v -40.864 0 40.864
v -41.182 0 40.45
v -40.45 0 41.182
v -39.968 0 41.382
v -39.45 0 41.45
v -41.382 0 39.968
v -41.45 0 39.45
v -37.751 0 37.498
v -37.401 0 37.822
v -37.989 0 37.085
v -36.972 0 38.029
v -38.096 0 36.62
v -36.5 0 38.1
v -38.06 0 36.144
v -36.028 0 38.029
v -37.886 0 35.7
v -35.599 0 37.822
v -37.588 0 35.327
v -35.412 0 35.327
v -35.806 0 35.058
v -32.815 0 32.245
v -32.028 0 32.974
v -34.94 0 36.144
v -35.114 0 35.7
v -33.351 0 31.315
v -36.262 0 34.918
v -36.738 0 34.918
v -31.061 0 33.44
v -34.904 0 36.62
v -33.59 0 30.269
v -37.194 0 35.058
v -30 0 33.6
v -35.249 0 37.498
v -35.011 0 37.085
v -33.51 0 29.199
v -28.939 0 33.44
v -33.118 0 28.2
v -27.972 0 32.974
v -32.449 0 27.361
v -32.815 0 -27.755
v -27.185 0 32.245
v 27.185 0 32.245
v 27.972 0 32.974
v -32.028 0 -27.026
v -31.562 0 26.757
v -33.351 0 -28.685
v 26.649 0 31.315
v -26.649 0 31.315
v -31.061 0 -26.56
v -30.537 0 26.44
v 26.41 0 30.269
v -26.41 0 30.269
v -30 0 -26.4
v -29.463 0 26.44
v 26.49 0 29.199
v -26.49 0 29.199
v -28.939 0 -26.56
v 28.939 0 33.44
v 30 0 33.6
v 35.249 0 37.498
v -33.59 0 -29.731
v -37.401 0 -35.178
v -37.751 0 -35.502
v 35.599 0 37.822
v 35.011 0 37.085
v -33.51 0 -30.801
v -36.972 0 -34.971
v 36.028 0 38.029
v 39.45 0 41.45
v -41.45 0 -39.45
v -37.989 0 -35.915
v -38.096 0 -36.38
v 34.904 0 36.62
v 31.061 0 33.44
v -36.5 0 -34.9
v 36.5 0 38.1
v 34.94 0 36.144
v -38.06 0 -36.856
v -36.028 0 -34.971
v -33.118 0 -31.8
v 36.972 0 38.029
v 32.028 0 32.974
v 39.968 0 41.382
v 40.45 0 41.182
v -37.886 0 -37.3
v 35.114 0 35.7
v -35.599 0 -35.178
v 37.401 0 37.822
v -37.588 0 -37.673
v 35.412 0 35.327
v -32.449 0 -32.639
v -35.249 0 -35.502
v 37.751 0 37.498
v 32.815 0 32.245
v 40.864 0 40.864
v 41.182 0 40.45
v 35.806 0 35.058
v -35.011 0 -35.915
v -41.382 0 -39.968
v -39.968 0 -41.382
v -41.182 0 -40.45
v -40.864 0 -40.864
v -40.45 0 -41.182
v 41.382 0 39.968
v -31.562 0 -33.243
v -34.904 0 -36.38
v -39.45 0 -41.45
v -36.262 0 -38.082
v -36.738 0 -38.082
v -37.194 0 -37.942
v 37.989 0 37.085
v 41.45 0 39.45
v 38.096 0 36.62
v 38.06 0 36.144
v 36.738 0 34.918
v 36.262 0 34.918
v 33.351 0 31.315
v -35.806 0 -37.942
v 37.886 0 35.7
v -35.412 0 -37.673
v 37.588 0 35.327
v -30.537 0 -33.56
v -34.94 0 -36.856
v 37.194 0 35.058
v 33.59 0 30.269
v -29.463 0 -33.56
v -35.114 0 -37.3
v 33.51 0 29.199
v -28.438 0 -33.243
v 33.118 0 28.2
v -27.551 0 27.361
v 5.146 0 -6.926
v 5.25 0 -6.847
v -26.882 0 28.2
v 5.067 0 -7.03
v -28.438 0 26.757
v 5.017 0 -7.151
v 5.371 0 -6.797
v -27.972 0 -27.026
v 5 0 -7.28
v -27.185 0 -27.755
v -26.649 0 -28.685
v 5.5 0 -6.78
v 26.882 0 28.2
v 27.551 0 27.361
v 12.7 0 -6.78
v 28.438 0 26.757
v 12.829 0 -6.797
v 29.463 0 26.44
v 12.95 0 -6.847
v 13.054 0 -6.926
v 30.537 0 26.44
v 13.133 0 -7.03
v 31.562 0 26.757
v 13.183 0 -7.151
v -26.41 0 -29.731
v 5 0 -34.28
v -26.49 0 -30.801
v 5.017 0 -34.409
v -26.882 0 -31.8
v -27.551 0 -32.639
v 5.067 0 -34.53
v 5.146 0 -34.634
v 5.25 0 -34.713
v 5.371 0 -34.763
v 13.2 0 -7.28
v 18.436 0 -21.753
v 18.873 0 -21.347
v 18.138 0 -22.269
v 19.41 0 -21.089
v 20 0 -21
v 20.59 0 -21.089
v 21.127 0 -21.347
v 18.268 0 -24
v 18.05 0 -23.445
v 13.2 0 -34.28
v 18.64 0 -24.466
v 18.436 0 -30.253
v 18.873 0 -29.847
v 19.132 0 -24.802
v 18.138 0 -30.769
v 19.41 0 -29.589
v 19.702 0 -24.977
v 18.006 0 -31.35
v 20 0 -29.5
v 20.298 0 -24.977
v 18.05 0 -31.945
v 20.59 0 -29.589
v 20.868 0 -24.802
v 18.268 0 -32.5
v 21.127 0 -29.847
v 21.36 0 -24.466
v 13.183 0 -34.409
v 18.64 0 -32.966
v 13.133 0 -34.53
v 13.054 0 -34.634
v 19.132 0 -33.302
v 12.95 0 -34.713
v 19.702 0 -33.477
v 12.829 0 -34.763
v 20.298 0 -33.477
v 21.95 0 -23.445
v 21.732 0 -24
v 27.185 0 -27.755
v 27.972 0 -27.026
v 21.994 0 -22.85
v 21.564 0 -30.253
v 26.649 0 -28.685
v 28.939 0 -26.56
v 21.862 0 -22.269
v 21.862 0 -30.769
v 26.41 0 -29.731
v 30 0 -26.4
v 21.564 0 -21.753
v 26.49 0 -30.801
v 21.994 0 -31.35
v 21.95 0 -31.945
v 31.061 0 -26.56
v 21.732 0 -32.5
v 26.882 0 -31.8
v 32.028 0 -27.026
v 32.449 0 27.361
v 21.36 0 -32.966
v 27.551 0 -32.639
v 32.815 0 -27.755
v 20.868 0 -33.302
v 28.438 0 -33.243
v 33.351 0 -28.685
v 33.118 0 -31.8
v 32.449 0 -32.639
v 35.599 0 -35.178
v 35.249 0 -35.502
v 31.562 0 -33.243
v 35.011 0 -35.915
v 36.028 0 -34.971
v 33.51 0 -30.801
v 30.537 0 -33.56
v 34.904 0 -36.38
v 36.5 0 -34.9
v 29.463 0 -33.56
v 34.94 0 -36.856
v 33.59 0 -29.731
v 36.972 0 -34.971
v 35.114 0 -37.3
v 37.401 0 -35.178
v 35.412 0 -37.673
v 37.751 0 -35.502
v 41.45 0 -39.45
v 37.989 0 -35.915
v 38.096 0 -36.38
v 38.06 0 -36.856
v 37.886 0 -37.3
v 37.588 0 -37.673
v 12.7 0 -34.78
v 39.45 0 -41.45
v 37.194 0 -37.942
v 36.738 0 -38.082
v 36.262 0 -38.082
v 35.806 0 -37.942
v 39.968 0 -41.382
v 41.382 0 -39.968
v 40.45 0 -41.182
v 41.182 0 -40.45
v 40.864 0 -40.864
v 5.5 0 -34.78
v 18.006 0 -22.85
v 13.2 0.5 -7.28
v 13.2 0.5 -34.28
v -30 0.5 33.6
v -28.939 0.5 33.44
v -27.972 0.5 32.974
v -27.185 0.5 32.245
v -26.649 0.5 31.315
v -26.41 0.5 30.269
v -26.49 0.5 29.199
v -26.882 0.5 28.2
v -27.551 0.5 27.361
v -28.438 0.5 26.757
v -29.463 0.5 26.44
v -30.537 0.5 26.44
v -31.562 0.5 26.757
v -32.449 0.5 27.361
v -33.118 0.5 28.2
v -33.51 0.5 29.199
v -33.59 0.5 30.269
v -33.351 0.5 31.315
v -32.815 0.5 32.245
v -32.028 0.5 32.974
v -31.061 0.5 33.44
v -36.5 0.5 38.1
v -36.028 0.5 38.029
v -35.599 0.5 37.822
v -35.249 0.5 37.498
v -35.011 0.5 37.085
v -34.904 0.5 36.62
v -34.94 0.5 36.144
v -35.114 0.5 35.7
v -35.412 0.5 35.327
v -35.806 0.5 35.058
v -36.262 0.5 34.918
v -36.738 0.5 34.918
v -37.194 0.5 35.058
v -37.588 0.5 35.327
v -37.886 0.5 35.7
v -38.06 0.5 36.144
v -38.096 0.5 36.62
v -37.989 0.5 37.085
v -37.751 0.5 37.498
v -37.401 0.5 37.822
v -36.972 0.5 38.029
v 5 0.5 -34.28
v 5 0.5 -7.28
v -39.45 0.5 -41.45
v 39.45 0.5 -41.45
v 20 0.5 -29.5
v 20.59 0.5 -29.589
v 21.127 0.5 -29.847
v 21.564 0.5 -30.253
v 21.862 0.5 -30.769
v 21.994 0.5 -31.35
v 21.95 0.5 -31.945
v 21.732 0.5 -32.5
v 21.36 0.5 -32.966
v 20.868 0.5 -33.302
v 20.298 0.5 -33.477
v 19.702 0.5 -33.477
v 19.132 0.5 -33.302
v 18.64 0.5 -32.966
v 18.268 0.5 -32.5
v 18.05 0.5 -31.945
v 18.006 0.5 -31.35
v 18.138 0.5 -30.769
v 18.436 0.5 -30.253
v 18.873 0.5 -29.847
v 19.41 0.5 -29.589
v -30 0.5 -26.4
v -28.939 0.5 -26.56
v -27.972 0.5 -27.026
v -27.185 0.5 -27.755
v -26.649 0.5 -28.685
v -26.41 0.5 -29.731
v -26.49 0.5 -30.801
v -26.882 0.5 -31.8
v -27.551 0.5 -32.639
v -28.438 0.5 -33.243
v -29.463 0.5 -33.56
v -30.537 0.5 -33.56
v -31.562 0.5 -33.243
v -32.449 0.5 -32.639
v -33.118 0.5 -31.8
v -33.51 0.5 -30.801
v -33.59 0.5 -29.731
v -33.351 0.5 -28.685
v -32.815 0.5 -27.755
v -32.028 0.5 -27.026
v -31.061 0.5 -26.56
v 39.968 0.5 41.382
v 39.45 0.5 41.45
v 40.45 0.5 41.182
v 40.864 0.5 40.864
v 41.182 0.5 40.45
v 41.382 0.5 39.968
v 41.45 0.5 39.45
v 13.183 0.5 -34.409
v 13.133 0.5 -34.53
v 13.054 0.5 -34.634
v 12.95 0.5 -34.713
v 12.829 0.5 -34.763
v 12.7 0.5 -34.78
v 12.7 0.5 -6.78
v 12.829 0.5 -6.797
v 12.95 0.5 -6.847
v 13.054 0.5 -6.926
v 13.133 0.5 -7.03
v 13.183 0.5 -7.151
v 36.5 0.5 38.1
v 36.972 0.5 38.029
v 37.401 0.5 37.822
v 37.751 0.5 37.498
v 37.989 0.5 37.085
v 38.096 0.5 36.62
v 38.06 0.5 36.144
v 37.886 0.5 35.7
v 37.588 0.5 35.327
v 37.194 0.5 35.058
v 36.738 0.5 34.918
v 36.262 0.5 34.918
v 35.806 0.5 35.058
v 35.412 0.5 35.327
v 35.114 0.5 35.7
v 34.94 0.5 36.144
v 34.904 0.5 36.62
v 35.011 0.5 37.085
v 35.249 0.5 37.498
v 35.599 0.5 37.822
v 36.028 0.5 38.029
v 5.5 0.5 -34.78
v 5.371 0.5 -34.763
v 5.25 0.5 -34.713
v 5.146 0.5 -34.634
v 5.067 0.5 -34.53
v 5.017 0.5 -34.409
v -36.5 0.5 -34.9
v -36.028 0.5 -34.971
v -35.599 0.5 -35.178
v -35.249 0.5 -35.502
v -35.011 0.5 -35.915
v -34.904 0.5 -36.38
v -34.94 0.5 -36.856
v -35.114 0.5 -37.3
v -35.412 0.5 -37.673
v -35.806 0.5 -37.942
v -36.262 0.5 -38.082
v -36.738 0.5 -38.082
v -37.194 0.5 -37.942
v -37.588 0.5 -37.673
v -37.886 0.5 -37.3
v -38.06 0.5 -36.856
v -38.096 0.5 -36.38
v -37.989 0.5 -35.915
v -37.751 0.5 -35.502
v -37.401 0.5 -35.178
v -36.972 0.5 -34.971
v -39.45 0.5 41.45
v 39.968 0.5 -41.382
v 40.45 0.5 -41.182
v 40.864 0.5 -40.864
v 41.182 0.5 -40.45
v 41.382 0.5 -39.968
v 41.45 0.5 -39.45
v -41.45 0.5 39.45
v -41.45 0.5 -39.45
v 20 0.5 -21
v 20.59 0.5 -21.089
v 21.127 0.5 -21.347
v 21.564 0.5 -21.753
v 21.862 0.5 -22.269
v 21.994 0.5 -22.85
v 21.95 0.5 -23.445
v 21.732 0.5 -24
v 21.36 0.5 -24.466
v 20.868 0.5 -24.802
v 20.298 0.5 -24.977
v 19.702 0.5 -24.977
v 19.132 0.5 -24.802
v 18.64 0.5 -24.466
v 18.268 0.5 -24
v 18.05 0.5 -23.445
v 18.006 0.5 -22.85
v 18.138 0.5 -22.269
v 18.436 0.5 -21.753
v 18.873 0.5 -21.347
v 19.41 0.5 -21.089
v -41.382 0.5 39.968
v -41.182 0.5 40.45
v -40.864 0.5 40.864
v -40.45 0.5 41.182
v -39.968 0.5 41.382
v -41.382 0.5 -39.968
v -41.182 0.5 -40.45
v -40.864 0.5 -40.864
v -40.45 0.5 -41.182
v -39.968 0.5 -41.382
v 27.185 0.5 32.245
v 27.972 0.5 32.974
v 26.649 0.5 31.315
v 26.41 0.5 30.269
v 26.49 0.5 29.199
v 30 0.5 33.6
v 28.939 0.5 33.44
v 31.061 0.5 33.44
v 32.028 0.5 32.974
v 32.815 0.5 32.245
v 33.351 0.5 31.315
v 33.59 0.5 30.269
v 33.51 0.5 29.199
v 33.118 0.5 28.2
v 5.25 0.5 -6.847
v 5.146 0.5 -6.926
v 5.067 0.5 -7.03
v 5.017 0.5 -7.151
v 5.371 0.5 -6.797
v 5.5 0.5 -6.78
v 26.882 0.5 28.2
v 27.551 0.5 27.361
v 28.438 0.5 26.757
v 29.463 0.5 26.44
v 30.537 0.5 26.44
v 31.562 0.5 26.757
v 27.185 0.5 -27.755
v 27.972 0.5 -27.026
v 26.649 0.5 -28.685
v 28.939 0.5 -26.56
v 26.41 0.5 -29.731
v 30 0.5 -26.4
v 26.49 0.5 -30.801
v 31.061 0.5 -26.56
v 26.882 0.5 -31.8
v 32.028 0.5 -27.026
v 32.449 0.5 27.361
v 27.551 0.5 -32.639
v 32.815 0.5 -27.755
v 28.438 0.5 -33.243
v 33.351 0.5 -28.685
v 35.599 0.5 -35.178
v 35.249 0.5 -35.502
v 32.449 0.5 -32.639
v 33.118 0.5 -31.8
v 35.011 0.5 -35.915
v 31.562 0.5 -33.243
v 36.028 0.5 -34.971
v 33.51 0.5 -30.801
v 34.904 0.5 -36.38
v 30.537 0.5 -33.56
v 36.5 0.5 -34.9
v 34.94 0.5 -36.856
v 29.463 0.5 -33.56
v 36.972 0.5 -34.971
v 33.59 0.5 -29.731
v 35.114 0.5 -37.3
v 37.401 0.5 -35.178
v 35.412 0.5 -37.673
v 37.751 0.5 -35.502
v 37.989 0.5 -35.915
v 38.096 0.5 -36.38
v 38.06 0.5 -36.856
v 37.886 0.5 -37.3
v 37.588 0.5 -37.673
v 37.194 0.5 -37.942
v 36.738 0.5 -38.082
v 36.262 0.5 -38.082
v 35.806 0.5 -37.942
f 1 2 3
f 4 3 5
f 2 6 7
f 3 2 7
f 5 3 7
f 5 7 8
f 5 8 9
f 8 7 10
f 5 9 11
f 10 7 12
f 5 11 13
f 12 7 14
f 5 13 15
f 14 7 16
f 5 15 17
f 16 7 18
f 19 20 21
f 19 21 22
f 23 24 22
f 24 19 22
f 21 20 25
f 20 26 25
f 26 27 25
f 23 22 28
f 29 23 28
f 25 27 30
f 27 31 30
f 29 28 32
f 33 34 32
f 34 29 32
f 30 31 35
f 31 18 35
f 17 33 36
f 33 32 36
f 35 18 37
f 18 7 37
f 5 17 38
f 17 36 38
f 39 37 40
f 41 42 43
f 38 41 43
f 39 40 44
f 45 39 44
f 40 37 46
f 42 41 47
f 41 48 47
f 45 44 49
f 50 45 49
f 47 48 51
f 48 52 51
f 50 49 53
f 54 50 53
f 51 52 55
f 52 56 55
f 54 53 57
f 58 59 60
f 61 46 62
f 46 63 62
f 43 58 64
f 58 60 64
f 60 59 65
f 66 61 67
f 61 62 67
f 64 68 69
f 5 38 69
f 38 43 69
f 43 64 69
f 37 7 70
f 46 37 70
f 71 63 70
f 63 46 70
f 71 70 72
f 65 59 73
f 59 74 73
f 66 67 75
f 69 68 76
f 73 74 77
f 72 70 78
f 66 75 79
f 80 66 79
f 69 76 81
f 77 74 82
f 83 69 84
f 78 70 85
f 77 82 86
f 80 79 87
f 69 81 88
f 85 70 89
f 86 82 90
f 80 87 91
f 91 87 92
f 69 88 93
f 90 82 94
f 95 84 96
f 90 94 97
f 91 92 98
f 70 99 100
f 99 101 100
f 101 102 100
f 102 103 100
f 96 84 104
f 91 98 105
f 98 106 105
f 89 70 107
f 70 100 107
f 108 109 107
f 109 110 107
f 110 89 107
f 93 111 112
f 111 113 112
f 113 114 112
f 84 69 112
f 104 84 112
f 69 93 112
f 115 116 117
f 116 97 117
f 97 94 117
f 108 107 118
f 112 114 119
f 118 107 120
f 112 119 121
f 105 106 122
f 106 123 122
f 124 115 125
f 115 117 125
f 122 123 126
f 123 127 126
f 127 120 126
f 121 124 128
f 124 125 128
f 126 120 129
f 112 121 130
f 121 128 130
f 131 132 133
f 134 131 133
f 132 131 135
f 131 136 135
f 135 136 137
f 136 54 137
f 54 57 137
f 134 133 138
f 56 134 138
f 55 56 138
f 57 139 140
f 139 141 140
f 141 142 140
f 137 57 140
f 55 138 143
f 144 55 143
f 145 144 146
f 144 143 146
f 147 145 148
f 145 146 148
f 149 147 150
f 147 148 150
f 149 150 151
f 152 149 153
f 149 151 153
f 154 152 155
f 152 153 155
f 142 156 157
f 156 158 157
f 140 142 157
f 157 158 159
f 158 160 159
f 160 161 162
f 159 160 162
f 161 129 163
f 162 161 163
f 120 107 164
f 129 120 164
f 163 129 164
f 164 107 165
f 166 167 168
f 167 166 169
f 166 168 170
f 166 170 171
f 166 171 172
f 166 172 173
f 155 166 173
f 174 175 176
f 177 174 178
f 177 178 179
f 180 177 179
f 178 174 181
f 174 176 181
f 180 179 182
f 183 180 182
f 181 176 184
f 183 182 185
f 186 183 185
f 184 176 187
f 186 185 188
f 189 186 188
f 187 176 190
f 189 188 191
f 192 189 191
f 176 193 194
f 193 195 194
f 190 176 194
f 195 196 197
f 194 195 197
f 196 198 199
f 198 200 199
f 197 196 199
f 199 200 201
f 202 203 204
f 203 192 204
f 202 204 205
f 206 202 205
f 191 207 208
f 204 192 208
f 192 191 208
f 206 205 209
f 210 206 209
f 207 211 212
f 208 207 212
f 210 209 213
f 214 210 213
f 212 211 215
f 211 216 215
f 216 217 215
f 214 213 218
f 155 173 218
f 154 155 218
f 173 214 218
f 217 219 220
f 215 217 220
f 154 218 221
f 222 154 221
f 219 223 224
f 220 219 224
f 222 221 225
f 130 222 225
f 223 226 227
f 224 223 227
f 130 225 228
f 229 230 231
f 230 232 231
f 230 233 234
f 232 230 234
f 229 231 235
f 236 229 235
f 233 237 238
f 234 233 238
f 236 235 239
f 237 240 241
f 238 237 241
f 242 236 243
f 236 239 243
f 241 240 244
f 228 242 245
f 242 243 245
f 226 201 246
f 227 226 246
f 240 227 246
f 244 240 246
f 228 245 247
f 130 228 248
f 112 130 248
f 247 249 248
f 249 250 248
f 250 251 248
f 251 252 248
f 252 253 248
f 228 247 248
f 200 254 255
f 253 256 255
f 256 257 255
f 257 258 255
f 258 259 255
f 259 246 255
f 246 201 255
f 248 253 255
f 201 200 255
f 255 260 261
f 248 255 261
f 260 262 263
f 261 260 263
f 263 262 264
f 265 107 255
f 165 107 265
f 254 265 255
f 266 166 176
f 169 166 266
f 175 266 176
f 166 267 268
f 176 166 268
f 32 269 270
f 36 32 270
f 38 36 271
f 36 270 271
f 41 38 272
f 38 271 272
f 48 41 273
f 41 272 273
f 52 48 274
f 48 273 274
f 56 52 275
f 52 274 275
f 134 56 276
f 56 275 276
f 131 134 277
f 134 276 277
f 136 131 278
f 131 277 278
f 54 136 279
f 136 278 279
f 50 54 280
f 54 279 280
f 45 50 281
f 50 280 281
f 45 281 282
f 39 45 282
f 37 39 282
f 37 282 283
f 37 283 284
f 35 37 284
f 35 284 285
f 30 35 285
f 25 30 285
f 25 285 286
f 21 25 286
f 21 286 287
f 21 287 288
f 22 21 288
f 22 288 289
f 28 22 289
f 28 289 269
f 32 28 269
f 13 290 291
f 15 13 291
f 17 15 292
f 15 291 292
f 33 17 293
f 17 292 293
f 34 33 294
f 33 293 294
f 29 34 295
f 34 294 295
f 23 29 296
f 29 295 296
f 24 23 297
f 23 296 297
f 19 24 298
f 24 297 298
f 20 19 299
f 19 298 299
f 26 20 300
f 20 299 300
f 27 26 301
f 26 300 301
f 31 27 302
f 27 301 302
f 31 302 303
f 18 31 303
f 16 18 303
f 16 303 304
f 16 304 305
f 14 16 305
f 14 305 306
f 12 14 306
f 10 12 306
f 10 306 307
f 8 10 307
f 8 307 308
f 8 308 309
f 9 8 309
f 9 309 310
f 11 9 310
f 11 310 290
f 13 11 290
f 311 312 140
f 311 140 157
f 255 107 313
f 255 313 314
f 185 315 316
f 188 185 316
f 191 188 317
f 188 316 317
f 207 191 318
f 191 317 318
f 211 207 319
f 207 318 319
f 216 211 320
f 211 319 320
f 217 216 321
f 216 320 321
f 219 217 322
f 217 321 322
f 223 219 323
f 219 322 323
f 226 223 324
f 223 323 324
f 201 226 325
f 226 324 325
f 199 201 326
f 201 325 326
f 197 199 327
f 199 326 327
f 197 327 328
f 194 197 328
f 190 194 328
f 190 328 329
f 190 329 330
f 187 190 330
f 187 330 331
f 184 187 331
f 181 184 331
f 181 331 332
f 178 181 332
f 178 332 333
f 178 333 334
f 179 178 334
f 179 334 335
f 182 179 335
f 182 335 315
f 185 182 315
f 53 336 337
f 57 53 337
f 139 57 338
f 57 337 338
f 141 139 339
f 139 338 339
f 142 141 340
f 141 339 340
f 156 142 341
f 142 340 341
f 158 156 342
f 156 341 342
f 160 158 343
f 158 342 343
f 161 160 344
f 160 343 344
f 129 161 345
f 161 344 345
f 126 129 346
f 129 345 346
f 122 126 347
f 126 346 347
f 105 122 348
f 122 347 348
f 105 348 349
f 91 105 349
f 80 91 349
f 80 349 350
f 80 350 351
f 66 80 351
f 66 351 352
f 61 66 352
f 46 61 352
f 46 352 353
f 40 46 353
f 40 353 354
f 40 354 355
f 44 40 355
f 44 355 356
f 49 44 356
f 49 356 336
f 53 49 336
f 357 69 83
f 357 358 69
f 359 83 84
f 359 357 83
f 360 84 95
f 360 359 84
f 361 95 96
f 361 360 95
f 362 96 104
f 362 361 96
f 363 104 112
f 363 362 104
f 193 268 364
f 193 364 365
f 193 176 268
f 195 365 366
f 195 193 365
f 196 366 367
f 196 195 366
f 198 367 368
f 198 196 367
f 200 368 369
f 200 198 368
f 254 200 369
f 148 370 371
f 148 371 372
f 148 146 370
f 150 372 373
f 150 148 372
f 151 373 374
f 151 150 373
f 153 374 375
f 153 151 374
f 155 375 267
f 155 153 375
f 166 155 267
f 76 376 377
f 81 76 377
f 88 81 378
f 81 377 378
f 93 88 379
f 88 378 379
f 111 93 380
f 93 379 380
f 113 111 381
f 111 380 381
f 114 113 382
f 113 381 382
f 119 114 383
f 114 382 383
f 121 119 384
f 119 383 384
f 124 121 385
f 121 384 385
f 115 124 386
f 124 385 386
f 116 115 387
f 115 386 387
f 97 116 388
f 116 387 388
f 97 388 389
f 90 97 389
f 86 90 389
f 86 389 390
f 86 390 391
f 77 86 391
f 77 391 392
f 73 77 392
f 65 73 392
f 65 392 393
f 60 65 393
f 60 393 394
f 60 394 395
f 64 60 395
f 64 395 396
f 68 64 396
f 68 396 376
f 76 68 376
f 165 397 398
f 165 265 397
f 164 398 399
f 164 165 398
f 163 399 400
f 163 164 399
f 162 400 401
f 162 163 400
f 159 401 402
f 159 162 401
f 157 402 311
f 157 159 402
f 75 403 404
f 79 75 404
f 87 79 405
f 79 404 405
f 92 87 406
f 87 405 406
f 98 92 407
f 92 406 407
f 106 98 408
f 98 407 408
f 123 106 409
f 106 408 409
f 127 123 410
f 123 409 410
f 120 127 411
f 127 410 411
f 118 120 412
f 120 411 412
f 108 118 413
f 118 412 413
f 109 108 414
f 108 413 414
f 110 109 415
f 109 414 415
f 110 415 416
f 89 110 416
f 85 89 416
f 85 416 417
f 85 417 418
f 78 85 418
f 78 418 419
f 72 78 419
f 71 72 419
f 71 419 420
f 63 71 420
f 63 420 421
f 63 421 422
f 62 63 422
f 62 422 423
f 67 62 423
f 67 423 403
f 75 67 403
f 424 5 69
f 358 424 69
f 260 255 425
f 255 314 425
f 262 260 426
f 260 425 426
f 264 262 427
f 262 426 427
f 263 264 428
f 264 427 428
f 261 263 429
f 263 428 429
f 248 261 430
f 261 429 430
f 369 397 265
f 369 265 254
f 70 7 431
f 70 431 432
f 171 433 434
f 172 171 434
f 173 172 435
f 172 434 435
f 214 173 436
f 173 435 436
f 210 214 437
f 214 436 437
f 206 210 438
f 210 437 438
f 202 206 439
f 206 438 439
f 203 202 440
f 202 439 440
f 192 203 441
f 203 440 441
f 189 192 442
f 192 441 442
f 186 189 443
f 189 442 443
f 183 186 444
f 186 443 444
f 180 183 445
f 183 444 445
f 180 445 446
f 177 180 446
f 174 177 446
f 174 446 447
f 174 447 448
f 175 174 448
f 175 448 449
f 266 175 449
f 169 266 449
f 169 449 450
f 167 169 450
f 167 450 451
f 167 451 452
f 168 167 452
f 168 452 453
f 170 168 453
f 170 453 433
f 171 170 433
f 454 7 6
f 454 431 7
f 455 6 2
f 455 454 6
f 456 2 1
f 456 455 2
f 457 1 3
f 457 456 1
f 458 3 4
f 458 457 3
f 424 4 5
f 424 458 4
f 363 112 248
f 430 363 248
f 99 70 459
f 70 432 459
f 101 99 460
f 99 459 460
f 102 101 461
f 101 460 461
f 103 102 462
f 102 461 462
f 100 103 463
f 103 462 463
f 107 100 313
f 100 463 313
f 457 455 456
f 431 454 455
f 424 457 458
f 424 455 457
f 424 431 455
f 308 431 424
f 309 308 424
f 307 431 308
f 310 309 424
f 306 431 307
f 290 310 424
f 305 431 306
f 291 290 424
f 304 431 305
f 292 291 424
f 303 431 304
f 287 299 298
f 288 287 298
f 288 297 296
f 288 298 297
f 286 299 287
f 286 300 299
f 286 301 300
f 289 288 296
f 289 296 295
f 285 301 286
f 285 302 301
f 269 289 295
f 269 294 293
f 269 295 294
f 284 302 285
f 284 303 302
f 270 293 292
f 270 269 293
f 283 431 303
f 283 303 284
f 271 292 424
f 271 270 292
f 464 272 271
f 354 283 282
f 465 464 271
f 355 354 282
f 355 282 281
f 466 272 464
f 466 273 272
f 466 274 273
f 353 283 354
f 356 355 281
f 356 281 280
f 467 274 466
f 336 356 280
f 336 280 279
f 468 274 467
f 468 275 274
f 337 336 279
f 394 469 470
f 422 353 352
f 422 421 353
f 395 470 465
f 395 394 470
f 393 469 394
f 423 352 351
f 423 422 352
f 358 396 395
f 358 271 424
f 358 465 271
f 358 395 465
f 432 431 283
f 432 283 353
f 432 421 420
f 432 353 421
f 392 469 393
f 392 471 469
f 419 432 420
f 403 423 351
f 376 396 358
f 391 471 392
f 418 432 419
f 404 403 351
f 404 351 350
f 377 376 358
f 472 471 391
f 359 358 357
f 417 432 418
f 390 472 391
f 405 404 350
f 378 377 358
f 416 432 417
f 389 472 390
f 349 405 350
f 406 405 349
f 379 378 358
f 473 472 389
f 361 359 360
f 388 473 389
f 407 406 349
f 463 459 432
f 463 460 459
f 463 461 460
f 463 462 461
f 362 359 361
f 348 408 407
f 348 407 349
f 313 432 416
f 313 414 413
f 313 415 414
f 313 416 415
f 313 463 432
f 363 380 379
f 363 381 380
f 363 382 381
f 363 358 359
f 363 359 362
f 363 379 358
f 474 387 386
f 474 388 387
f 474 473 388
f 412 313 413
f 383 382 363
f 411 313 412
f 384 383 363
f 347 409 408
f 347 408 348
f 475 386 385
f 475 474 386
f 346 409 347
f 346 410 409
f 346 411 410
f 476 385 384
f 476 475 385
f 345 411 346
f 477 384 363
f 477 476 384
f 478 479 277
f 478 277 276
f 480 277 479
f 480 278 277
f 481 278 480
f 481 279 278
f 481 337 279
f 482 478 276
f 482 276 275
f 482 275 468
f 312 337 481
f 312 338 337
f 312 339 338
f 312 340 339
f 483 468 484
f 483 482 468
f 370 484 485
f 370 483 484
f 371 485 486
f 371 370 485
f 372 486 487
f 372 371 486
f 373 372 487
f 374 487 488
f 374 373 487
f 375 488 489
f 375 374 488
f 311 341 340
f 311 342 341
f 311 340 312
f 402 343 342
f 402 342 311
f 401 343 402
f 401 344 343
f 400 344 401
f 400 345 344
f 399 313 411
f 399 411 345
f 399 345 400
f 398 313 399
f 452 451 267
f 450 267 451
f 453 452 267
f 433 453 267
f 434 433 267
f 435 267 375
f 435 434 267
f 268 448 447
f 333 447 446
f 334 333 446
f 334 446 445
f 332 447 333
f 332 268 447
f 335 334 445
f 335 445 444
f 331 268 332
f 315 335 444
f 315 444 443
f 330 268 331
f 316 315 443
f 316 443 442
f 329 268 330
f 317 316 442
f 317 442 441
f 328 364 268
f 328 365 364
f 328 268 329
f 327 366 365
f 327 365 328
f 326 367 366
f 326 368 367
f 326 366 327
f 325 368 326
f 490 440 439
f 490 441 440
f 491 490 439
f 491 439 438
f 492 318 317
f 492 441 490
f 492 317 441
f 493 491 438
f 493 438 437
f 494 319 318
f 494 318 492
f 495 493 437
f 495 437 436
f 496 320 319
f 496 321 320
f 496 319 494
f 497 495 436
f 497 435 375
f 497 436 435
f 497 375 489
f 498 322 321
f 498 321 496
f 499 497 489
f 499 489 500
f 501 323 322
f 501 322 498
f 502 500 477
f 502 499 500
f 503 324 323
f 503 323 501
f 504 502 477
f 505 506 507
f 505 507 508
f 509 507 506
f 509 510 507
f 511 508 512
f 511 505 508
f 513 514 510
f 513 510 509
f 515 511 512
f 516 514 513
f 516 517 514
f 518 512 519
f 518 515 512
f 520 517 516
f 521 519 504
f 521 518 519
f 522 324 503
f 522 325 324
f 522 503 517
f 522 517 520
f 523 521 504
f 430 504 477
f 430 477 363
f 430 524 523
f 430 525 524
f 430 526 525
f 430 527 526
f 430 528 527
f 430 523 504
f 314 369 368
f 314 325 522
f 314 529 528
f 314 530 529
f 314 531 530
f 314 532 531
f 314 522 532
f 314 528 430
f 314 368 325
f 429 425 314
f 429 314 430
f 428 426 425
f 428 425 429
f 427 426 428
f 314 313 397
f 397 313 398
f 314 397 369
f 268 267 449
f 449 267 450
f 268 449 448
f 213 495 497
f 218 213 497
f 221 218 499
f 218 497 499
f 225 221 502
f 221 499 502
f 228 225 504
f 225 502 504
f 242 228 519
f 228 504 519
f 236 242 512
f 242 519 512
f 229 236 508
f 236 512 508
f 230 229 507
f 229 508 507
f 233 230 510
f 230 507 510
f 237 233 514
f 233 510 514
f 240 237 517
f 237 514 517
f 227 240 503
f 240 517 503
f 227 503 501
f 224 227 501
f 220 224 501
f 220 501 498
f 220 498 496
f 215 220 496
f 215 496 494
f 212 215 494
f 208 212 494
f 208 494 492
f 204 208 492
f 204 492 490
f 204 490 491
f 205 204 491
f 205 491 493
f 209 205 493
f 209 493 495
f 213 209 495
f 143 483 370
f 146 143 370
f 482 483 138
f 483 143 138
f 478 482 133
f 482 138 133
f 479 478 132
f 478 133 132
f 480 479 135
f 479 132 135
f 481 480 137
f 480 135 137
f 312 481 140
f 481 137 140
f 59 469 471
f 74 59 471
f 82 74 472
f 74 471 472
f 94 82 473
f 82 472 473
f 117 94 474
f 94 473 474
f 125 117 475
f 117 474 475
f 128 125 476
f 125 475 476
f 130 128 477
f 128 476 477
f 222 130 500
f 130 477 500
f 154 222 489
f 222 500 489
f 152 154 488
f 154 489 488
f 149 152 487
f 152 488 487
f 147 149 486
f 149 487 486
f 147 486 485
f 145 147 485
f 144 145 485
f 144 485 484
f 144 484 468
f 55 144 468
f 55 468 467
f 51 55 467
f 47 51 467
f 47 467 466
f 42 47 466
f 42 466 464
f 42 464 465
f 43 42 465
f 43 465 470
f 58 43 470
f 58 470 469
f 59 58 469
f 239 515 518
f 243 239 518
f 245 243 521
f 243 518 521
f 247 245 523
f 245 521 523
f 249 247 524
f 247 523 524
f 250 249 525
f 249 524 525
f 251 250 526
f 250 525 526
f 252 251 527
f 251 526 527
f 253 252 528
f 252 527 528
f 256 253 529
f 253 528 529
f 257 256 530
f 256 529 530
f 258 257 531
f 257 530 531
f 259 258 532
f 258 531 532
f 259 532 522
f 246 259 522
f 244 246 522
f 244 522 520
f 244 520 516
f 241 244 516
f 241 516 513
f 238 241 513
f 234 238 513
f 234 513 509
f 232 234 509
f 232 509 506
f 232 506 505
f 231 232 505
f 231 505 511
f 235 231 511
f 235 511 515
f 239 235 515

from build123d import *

# Parameters (mm, degrees)
SKETCH1_W           = 82.9
SKETCH1_H           = 82.9
BOSS_EXTRUDE1_DEPTH = 0.5
SKETCH2_R           = 3.6
CUT_EXTRUDE1_DEPTH  = 59.62128453
FILLET1_R           = 2
SKETCH3_R           = 1.6
CUT_EXTRUDE2_DEPTH  = 10
SKETCH4_R           = 2
CUT_EXTRUDE3_DEPTH  = 10
SKETCH7_W           = 8.2
SKETCH7_H           = 28
CUT_EXTRUDE5_DEPTH  = 10
FILLET3_R           = 0.5


with BuildPart() as part:
    # Sketch1 → Boss-Extrude1 (new body)
    with BuildSketch(Plane(origin=(0, 0, 0), x_dir=(1, 0, 0), z_dir=(0, 1, 0))):
        Rectangle(SKETCH1_W, SKETCH1_H)
    extrude(amount=BOSS_EXTRUDE1_DEPTH)

    # Sketch2 → Cut-Extrude1 (cut, through all)
    with BuildSketch(Plane(origin=(0, 0.5, 0), x_dir=(1, 0, 0), z_dir=(0, 1, 0))):
        with Locations(Location((-30, 30, 0), (0, 0, 270))):
            Circle(SKETCH2_R)
        with Locations(Location((30, 30, 0), (0, 0, 270))):
            Circle(SKETCH2_R)
        with Locations(Location((30, -30, 0), (0, 0, 270))):
            Circle(SKETCH2_R)
        with Locations(Location((-30, -30, 0), (0, 0, 270))):
            Circle(SKETCH2_R)
    extrude(amount=-CUT_EXTRUDE1_DEPTH, mode=Mode.SUBTRACT)

    # Fillet1
    fillet1_edges = [part.edges().sort_by_distance(p)[0] for p in [
        (41.45, 0.25, 41.45),
        (-41.45, 0.25, 41.45),
        (-41.45, 0.25, -41.45),
        (41.45, 0.25, -41.45),
    ]]
    fillet(fillet1_edges, radius=FILLET1_R)

    # Sketch3 → Cut-Extrude2 (cut)
    with BuildSketch(Plane(origin=(0, 0.5, 0), x_dir=(1, 0, 0), z_dir=(0, 1, 0))):
        with Locations(Location((-36.5, 36.5, 0), (0, 0, 270))):
            Circle(SKETCH3_R)
        with Locations(Location((36.5, 36.5, 0), (0, 0, 270))):
            Circle(SKETCH3_R)
        with Locations(Location((36.5, -36.5, 0), (0, 0, 270))):
            Circle(SKETCH3_R)
        with Locations(Location((-36.5, -36.5, 0), (0, 0, 270))):
            Circle(SKETCH3_R)
    extrude(amount=-CUT_EXTRUDE2_DEPTH, mode=Mode.SUBTRACT)

    # Sketch4 → Cut-Extrude3 (cut)
    with BuildSketch(Plane(origin=(0, 0.5, 0), x_dir=(1, 0, 0), z_dir=(0, 1, 0))):
        with Locations(Location((19.999999567, 31.499795659, 0), (0, 0, 270))):
            Circle(SKETCH4_R)
        with Locations(Location((19.999999567, 22.999799474, 0), (0, 0, 270))):
            Circle(SKETCH4_R)
    extrude(amount=-CUT_EXTRUDE3_DEPTH, mode=Mode.SUBTRACT)

    # Sketch7 → Cut-Extrude5 (cut)
    with BuildSketch(Plane(origin=(0, 0.5, 0), x_dir=(1, 0, 0), z_dir=(0, 1, 0))):
        with Locations((9.09999852, 20.7799998)):
            Rectangle(SKETCH7_W, SKETCH7_H)
    extrude(amount=-CUT_EXTRUDE5_DEPTH, mode=Mode.SUBTRACT)

    # Fillet3
    fillet3_edges = [part.edges().sort_by_distance(p)[0] for p in [
        (13.19999852, 0.25, -34.7799998),
        (13.19999852, 0.25, -6.7799998),
        (4.99999852, 0.25, -6.7799998),
        (4.99999852, 0.25, -34.7799998),
    ]]
    fillet(fillet3_edges, radius=FILLET3_R)


solid = part.part
